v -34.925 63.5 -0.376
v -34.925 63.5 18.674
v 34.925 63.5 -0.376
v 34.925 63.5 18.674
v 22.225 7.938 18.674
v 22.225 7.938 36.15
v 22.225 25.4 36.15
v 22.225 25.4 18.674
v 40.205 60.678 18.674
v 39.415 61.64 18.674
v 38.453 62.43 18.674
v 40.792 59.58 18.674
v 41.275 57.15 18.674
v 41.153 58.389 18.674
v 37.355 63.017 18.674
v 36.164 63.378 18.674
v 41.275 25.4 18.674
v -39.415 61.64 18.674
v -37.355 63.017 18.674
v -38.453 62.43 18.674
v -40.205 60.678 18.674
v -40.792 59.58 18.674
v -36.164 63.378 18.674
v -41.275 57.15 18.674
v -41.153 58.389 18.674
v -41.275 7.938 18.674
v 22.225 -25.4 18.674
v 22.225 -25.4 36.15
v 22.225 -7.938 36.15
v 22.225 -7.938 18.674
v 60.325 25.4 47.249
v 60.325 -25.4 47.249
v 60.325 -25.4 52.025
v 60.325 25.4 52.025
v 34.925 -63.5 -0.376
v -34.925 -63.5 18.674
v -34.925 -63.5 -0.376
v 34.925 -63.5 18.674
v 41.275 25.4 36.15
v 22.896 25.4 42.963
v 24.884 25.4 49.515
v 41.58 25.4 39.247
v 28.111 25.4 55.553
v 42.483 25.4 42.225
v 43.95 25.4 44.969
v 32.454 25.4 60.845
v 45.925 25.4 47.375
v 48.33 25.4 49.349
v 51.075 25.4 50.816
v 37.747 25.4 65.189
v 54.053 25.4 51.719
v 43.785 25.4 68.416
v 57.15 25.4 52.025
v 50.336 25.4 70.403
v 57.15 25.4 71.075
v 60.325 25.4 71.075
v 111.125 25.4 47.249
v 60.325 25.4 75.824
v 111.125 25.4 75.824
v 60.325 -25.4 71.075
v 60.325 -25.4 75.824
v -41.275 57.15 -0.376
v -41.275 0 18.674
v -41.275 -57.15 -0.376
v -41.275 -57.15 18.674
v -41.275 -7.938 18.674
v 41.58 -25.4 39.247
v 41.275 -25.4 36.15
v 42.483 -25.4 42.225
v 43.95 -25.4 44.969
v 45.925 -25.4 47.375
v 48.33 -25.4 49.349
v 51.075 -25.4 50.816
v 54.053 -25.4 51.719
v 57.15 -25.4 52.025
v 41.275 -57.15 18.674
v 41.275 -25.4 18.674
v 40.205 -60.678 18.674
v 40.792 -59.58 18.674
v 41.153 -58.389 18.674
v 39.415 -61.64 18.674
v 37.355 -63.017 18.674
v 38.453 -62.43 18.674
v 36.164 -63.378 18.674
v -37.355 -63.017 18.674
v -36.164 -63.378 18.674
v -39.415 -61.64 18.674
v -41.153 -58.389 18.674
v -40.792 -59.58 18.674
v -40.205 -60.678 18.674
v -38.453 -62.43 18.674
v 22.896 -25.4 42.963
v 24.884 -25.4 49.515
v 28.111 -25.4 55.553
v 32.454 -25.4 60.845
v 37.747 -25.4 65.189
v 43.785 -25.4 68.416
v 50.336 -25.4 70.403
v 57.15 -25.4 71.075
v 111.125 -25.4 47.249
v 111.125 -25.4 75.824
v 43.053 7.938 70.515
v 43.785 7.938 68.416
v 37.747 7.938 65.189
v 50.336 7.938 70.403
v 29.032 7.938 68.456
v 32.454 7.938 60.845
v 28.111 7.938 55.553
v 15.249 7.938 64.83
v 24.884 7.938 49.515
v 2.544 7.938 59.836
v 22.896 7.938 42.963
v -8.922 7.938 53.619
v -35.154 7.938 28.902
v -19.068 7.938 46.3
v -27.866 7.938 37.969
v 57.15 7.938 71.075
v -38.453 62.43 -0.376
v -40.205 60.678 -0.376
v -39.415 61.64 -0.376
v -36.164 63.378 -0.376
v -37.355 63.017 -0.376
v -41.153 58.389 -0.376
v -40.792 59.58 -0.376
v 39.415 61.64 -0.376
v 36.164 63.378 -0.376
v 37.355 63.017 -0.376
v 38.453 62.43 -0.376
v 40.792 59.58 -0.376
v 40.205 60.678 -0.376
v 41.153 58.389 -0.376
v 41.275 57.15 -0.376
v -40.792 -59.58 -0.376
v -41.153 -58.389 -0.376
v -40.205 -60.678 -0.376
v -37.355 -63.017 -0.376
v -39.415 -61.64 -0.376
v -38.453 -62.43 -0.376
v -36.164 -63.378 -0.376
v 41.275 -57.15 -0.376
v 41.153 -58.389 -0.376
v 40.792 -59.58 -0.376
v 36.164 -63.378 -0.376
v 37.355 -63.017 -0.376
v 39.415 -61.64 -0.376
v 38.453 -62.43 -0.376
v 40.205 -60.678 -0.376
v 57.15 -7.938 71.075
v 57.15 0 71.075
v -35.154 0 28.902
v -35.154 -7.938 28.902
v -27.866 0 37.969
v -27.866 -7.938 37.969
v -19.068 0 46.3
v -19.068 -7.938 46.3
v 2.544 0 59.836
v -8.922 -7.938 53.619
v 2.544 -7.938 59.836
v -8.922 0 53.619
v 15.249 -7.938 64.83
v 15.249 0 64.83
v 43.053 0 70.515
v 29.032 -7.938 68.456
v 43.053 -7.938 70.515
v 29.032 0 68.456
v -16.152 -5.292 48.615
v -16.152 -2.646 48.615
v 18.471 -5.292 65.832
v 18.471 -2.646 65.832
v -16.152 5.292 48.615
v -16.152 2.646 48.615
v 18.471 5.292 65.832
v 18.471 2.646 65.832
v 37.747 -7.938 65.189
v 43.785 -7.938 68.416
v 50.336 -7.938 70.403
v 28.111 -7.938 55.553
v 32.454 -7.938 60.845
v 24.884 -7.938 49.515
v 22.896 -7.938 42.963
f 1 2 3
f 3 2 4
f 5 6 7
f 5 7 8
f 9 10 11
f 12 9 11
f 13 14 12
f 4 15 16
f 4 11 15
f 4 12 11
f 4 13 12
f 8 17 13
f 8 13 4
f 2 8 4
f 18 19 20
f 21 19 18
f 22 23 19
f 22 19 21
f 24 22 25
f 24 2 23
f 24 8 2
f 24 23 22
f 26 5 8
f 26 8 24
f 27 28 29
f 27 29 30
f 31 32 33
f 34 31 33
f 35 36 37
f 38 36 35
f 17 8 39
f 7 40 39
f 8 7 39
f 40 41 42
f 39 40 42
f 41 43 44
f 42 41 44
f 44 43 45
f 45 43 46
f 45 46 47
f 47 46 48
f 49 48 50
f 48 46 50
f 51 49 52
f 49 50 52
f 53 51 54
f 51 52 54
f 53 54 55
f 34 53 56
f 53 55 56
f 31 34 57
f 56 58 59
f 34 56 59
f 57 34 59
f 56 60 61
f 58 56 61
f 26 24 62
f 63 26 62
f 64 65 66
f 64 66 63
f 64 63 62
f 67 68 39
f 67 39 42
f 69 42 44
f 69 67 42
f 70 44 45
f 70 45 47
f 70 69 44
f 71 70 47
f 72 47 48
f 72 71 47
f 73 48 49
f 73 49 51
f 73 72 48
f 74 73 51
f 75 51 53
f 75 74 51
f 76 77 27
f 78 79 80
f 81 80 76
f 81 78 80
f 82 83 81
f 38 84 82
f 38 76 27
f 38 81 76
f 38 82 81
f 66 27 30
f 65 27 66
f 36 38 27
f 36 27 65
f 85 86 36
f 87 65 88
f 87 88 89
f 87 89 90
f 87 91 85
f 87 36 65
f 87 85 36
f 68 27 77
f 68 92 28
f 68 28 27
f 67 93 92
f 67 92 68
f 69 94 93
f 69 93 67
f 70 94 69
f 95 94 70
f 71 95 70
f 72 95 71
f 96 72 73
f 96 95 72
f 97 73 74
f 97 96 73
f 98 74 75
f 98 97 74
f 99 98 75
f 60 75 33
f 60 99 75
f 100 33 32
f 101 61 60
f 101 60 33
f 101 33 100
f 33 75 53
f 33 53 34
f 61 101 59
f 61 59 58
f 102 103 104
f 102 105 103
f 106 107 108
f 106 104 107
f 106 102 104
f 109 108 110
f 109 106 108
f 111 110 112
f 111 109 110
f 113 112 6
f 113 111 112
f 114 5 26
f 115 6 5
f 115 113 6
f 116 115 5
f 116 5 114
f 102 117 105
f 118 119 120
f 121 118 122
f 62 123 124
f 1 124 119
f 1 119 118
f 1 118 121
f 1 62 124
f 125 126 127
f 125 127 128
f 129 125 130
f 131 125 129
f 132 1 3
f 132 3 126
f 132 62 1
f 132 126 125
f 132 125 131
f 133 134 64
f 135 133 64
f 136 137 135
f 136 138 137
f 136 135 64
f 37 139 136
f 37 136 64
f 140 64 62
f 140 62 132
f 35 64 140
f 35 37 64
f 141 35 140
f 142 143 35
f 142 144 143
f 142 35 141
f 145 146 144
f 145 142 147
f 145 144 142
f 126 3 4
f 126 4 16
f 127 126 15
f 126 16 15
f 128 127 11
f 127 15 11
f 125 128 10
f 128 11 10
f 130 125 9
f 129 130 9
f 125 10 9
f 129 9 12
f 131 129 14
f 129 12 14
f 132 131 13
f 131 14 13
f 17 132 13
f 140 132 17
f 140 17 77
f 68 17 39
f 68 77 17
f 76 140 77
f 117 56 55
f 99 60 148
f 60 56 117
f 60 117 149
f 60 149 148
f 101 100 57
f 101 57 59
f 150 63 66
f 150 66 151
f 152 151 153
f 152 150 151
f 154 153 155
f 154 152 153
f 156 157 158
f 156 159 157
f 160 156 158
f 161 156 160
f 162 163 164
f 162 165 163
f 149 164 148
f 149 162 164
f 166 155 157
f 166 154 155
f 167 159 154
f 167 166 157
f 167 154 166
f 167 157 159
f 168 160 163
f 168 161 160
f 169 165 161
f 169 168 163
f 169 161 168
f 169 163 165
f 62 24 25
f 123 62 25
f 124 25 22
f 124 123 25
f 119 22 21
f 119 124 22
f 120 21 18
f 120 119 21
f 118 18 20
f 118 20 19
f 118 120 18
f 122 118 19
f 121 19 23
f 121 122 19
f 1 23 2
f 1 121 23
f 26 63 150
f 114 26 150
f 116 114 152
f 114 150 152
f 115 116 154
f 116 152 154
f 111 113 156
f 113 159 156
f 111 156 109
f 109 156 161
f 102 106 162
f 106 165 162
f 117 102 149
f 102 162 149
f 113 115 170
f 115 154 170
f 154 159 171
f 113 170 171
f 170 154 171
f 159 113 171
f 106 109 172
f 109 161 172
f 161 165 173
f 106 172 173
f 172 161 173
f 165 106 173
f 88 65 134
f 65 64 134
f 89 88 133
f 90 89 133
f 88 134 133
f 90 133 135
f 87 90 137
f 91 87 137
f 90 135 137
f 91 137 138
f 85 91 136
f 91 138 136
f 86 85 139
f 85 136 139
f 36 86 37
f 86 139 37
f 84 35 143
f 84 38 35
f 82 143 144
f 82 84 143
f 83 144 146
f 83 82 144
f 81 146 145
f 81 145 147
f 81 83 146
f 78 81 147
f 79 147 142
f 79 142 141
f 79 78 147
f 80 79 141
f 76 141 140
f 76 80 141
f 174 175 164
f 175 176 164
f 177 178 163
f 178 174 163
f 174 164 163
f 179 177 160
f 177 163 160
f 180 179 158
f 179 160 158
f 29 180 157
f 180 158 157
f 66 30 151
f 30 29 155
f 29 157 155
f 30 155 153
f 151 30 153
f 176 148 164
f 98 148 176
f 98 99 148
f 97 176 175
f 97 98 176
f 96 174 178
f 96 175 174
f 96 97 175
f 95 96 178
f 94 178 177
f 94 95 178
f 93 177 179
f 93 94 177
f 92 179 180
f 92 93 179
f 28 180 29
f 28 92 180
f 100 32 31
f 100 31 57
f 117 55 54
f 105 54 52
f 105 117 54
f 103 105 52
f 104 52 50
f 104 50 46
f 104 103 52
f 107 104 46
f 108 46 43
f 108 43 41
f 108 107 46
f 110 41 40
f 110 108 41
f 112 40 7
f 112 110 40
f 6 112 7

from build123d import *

# Parameters (mm, degrees)
F1_DEPTH = 63.5
F0_W     = 19.3484129535
F0_H     = 19.05
F0_H_2   = 4.7498
F0_H_3   = 4.7752
F2_DEPTH = 25.4
F3_DEPTH = 7.9375
F4_R     = 6.35


with BuildPart() as f1:
    # F0 (on Front) → F1 (new body, symmetric)
    with BuildSketch(Plane.XZ):
        Polygon((-41.275, 18.6743041574), (-41.275, -0.3756958426), (41.275, -0.3756958426), (41.275, 18.6743041574), (22.225, 18.6743041574), align=None)
    extrude(amount=F1_DEPTH, both=True)

    # F0 (on Front) → F2 (join, symmetric)
    with BuildSketch(Plane.XZ):
        with BuildLine():
            Line((22.225, 18.6743041574), (41.275, 18.6743041574))
            Line((41.275, 18.6743041574), (41.275, 36.1495041574))
            ThreePointArc((41.275, 36.1495041574), (45.9246798487, 47.3748243087), (57.15, 52.0245041574))
            Line((57.15, 52.0245041574), (60.325, 52.0245041574))
            Line((60.325, 52.0245041574), (60.325, 71.0745041574))
            Line((60.325, 71.0745041574), (57.15, 71.0745041574))
            ThreePointArc((57.15, 71.0745041574), (32.4542956671, 60.8452084903), (22.225, 36.1495041574))
            Line((22.225, 36.1495041574), (22.225, 18.6743041574))
        make_face()
        Polygon((79.6734129535, 75.8243041574), (79.6734129535, 71.0745041574), (79.6734129535, 52.0245041574), (79.6734129535, 47.2493041574), (111.125, 47.2493041574), (111.125, 75.8243041574), align=None)
        with Locations((69.9992064767, 61.5495041574)):
            Rectangle(F0_W, F0_H)
        with Locations((69.9992064767, 73.4494041574)):
            Rectangle(F0_W, F0_H_2)
        with Locations((69.9992064767, 49.6369041574)):
            Rectangle(F0_W, F0_H_3)
    extrude(amount=F2_DEPTH, both=True)

    # F0 (on Front) → F3 (join, symmetric)
    with BuildSketch(Plane.XZ):
        with BuildLine():
            add(Edge.make_bspline(
                [(-41.275, 18.6743041574), (-22.7171909064, 55.2262067795), (18.2569045573, 71.5698078275), (57.15, 71.0745041574)],
                knots=[0, 0, 0, 0, 111.5045361635, 111.5045361635, 111.5045361635, 111.5045361635], degree=3))
            Line((-41.275, 18.6743041574), (22.225, 18.6743041574))
            Line((22.225, 18.6743041574), (22.225, 36.1495041574))
            ThreePointArc((22.225, 36.1495041574), (32.4542956671, 60.8452084903), (57.15, 71.0745041574))
        make_face()
    extrude(amount=F3_DEPTH, both=True)

    # F4
    f4_edges = [f1.edges().sort_by_distance(p)[0] for p in [
        (-41.275, 63.5, 9.149304),
        (-41.275, -63.5, 9.149304),
        (41.275, 63.5, 9.149304),
        (41.275, -63.5, 9.149304),
    ]]
    fillet(f4_edges, radius=F4_R)


solid = f1.part
